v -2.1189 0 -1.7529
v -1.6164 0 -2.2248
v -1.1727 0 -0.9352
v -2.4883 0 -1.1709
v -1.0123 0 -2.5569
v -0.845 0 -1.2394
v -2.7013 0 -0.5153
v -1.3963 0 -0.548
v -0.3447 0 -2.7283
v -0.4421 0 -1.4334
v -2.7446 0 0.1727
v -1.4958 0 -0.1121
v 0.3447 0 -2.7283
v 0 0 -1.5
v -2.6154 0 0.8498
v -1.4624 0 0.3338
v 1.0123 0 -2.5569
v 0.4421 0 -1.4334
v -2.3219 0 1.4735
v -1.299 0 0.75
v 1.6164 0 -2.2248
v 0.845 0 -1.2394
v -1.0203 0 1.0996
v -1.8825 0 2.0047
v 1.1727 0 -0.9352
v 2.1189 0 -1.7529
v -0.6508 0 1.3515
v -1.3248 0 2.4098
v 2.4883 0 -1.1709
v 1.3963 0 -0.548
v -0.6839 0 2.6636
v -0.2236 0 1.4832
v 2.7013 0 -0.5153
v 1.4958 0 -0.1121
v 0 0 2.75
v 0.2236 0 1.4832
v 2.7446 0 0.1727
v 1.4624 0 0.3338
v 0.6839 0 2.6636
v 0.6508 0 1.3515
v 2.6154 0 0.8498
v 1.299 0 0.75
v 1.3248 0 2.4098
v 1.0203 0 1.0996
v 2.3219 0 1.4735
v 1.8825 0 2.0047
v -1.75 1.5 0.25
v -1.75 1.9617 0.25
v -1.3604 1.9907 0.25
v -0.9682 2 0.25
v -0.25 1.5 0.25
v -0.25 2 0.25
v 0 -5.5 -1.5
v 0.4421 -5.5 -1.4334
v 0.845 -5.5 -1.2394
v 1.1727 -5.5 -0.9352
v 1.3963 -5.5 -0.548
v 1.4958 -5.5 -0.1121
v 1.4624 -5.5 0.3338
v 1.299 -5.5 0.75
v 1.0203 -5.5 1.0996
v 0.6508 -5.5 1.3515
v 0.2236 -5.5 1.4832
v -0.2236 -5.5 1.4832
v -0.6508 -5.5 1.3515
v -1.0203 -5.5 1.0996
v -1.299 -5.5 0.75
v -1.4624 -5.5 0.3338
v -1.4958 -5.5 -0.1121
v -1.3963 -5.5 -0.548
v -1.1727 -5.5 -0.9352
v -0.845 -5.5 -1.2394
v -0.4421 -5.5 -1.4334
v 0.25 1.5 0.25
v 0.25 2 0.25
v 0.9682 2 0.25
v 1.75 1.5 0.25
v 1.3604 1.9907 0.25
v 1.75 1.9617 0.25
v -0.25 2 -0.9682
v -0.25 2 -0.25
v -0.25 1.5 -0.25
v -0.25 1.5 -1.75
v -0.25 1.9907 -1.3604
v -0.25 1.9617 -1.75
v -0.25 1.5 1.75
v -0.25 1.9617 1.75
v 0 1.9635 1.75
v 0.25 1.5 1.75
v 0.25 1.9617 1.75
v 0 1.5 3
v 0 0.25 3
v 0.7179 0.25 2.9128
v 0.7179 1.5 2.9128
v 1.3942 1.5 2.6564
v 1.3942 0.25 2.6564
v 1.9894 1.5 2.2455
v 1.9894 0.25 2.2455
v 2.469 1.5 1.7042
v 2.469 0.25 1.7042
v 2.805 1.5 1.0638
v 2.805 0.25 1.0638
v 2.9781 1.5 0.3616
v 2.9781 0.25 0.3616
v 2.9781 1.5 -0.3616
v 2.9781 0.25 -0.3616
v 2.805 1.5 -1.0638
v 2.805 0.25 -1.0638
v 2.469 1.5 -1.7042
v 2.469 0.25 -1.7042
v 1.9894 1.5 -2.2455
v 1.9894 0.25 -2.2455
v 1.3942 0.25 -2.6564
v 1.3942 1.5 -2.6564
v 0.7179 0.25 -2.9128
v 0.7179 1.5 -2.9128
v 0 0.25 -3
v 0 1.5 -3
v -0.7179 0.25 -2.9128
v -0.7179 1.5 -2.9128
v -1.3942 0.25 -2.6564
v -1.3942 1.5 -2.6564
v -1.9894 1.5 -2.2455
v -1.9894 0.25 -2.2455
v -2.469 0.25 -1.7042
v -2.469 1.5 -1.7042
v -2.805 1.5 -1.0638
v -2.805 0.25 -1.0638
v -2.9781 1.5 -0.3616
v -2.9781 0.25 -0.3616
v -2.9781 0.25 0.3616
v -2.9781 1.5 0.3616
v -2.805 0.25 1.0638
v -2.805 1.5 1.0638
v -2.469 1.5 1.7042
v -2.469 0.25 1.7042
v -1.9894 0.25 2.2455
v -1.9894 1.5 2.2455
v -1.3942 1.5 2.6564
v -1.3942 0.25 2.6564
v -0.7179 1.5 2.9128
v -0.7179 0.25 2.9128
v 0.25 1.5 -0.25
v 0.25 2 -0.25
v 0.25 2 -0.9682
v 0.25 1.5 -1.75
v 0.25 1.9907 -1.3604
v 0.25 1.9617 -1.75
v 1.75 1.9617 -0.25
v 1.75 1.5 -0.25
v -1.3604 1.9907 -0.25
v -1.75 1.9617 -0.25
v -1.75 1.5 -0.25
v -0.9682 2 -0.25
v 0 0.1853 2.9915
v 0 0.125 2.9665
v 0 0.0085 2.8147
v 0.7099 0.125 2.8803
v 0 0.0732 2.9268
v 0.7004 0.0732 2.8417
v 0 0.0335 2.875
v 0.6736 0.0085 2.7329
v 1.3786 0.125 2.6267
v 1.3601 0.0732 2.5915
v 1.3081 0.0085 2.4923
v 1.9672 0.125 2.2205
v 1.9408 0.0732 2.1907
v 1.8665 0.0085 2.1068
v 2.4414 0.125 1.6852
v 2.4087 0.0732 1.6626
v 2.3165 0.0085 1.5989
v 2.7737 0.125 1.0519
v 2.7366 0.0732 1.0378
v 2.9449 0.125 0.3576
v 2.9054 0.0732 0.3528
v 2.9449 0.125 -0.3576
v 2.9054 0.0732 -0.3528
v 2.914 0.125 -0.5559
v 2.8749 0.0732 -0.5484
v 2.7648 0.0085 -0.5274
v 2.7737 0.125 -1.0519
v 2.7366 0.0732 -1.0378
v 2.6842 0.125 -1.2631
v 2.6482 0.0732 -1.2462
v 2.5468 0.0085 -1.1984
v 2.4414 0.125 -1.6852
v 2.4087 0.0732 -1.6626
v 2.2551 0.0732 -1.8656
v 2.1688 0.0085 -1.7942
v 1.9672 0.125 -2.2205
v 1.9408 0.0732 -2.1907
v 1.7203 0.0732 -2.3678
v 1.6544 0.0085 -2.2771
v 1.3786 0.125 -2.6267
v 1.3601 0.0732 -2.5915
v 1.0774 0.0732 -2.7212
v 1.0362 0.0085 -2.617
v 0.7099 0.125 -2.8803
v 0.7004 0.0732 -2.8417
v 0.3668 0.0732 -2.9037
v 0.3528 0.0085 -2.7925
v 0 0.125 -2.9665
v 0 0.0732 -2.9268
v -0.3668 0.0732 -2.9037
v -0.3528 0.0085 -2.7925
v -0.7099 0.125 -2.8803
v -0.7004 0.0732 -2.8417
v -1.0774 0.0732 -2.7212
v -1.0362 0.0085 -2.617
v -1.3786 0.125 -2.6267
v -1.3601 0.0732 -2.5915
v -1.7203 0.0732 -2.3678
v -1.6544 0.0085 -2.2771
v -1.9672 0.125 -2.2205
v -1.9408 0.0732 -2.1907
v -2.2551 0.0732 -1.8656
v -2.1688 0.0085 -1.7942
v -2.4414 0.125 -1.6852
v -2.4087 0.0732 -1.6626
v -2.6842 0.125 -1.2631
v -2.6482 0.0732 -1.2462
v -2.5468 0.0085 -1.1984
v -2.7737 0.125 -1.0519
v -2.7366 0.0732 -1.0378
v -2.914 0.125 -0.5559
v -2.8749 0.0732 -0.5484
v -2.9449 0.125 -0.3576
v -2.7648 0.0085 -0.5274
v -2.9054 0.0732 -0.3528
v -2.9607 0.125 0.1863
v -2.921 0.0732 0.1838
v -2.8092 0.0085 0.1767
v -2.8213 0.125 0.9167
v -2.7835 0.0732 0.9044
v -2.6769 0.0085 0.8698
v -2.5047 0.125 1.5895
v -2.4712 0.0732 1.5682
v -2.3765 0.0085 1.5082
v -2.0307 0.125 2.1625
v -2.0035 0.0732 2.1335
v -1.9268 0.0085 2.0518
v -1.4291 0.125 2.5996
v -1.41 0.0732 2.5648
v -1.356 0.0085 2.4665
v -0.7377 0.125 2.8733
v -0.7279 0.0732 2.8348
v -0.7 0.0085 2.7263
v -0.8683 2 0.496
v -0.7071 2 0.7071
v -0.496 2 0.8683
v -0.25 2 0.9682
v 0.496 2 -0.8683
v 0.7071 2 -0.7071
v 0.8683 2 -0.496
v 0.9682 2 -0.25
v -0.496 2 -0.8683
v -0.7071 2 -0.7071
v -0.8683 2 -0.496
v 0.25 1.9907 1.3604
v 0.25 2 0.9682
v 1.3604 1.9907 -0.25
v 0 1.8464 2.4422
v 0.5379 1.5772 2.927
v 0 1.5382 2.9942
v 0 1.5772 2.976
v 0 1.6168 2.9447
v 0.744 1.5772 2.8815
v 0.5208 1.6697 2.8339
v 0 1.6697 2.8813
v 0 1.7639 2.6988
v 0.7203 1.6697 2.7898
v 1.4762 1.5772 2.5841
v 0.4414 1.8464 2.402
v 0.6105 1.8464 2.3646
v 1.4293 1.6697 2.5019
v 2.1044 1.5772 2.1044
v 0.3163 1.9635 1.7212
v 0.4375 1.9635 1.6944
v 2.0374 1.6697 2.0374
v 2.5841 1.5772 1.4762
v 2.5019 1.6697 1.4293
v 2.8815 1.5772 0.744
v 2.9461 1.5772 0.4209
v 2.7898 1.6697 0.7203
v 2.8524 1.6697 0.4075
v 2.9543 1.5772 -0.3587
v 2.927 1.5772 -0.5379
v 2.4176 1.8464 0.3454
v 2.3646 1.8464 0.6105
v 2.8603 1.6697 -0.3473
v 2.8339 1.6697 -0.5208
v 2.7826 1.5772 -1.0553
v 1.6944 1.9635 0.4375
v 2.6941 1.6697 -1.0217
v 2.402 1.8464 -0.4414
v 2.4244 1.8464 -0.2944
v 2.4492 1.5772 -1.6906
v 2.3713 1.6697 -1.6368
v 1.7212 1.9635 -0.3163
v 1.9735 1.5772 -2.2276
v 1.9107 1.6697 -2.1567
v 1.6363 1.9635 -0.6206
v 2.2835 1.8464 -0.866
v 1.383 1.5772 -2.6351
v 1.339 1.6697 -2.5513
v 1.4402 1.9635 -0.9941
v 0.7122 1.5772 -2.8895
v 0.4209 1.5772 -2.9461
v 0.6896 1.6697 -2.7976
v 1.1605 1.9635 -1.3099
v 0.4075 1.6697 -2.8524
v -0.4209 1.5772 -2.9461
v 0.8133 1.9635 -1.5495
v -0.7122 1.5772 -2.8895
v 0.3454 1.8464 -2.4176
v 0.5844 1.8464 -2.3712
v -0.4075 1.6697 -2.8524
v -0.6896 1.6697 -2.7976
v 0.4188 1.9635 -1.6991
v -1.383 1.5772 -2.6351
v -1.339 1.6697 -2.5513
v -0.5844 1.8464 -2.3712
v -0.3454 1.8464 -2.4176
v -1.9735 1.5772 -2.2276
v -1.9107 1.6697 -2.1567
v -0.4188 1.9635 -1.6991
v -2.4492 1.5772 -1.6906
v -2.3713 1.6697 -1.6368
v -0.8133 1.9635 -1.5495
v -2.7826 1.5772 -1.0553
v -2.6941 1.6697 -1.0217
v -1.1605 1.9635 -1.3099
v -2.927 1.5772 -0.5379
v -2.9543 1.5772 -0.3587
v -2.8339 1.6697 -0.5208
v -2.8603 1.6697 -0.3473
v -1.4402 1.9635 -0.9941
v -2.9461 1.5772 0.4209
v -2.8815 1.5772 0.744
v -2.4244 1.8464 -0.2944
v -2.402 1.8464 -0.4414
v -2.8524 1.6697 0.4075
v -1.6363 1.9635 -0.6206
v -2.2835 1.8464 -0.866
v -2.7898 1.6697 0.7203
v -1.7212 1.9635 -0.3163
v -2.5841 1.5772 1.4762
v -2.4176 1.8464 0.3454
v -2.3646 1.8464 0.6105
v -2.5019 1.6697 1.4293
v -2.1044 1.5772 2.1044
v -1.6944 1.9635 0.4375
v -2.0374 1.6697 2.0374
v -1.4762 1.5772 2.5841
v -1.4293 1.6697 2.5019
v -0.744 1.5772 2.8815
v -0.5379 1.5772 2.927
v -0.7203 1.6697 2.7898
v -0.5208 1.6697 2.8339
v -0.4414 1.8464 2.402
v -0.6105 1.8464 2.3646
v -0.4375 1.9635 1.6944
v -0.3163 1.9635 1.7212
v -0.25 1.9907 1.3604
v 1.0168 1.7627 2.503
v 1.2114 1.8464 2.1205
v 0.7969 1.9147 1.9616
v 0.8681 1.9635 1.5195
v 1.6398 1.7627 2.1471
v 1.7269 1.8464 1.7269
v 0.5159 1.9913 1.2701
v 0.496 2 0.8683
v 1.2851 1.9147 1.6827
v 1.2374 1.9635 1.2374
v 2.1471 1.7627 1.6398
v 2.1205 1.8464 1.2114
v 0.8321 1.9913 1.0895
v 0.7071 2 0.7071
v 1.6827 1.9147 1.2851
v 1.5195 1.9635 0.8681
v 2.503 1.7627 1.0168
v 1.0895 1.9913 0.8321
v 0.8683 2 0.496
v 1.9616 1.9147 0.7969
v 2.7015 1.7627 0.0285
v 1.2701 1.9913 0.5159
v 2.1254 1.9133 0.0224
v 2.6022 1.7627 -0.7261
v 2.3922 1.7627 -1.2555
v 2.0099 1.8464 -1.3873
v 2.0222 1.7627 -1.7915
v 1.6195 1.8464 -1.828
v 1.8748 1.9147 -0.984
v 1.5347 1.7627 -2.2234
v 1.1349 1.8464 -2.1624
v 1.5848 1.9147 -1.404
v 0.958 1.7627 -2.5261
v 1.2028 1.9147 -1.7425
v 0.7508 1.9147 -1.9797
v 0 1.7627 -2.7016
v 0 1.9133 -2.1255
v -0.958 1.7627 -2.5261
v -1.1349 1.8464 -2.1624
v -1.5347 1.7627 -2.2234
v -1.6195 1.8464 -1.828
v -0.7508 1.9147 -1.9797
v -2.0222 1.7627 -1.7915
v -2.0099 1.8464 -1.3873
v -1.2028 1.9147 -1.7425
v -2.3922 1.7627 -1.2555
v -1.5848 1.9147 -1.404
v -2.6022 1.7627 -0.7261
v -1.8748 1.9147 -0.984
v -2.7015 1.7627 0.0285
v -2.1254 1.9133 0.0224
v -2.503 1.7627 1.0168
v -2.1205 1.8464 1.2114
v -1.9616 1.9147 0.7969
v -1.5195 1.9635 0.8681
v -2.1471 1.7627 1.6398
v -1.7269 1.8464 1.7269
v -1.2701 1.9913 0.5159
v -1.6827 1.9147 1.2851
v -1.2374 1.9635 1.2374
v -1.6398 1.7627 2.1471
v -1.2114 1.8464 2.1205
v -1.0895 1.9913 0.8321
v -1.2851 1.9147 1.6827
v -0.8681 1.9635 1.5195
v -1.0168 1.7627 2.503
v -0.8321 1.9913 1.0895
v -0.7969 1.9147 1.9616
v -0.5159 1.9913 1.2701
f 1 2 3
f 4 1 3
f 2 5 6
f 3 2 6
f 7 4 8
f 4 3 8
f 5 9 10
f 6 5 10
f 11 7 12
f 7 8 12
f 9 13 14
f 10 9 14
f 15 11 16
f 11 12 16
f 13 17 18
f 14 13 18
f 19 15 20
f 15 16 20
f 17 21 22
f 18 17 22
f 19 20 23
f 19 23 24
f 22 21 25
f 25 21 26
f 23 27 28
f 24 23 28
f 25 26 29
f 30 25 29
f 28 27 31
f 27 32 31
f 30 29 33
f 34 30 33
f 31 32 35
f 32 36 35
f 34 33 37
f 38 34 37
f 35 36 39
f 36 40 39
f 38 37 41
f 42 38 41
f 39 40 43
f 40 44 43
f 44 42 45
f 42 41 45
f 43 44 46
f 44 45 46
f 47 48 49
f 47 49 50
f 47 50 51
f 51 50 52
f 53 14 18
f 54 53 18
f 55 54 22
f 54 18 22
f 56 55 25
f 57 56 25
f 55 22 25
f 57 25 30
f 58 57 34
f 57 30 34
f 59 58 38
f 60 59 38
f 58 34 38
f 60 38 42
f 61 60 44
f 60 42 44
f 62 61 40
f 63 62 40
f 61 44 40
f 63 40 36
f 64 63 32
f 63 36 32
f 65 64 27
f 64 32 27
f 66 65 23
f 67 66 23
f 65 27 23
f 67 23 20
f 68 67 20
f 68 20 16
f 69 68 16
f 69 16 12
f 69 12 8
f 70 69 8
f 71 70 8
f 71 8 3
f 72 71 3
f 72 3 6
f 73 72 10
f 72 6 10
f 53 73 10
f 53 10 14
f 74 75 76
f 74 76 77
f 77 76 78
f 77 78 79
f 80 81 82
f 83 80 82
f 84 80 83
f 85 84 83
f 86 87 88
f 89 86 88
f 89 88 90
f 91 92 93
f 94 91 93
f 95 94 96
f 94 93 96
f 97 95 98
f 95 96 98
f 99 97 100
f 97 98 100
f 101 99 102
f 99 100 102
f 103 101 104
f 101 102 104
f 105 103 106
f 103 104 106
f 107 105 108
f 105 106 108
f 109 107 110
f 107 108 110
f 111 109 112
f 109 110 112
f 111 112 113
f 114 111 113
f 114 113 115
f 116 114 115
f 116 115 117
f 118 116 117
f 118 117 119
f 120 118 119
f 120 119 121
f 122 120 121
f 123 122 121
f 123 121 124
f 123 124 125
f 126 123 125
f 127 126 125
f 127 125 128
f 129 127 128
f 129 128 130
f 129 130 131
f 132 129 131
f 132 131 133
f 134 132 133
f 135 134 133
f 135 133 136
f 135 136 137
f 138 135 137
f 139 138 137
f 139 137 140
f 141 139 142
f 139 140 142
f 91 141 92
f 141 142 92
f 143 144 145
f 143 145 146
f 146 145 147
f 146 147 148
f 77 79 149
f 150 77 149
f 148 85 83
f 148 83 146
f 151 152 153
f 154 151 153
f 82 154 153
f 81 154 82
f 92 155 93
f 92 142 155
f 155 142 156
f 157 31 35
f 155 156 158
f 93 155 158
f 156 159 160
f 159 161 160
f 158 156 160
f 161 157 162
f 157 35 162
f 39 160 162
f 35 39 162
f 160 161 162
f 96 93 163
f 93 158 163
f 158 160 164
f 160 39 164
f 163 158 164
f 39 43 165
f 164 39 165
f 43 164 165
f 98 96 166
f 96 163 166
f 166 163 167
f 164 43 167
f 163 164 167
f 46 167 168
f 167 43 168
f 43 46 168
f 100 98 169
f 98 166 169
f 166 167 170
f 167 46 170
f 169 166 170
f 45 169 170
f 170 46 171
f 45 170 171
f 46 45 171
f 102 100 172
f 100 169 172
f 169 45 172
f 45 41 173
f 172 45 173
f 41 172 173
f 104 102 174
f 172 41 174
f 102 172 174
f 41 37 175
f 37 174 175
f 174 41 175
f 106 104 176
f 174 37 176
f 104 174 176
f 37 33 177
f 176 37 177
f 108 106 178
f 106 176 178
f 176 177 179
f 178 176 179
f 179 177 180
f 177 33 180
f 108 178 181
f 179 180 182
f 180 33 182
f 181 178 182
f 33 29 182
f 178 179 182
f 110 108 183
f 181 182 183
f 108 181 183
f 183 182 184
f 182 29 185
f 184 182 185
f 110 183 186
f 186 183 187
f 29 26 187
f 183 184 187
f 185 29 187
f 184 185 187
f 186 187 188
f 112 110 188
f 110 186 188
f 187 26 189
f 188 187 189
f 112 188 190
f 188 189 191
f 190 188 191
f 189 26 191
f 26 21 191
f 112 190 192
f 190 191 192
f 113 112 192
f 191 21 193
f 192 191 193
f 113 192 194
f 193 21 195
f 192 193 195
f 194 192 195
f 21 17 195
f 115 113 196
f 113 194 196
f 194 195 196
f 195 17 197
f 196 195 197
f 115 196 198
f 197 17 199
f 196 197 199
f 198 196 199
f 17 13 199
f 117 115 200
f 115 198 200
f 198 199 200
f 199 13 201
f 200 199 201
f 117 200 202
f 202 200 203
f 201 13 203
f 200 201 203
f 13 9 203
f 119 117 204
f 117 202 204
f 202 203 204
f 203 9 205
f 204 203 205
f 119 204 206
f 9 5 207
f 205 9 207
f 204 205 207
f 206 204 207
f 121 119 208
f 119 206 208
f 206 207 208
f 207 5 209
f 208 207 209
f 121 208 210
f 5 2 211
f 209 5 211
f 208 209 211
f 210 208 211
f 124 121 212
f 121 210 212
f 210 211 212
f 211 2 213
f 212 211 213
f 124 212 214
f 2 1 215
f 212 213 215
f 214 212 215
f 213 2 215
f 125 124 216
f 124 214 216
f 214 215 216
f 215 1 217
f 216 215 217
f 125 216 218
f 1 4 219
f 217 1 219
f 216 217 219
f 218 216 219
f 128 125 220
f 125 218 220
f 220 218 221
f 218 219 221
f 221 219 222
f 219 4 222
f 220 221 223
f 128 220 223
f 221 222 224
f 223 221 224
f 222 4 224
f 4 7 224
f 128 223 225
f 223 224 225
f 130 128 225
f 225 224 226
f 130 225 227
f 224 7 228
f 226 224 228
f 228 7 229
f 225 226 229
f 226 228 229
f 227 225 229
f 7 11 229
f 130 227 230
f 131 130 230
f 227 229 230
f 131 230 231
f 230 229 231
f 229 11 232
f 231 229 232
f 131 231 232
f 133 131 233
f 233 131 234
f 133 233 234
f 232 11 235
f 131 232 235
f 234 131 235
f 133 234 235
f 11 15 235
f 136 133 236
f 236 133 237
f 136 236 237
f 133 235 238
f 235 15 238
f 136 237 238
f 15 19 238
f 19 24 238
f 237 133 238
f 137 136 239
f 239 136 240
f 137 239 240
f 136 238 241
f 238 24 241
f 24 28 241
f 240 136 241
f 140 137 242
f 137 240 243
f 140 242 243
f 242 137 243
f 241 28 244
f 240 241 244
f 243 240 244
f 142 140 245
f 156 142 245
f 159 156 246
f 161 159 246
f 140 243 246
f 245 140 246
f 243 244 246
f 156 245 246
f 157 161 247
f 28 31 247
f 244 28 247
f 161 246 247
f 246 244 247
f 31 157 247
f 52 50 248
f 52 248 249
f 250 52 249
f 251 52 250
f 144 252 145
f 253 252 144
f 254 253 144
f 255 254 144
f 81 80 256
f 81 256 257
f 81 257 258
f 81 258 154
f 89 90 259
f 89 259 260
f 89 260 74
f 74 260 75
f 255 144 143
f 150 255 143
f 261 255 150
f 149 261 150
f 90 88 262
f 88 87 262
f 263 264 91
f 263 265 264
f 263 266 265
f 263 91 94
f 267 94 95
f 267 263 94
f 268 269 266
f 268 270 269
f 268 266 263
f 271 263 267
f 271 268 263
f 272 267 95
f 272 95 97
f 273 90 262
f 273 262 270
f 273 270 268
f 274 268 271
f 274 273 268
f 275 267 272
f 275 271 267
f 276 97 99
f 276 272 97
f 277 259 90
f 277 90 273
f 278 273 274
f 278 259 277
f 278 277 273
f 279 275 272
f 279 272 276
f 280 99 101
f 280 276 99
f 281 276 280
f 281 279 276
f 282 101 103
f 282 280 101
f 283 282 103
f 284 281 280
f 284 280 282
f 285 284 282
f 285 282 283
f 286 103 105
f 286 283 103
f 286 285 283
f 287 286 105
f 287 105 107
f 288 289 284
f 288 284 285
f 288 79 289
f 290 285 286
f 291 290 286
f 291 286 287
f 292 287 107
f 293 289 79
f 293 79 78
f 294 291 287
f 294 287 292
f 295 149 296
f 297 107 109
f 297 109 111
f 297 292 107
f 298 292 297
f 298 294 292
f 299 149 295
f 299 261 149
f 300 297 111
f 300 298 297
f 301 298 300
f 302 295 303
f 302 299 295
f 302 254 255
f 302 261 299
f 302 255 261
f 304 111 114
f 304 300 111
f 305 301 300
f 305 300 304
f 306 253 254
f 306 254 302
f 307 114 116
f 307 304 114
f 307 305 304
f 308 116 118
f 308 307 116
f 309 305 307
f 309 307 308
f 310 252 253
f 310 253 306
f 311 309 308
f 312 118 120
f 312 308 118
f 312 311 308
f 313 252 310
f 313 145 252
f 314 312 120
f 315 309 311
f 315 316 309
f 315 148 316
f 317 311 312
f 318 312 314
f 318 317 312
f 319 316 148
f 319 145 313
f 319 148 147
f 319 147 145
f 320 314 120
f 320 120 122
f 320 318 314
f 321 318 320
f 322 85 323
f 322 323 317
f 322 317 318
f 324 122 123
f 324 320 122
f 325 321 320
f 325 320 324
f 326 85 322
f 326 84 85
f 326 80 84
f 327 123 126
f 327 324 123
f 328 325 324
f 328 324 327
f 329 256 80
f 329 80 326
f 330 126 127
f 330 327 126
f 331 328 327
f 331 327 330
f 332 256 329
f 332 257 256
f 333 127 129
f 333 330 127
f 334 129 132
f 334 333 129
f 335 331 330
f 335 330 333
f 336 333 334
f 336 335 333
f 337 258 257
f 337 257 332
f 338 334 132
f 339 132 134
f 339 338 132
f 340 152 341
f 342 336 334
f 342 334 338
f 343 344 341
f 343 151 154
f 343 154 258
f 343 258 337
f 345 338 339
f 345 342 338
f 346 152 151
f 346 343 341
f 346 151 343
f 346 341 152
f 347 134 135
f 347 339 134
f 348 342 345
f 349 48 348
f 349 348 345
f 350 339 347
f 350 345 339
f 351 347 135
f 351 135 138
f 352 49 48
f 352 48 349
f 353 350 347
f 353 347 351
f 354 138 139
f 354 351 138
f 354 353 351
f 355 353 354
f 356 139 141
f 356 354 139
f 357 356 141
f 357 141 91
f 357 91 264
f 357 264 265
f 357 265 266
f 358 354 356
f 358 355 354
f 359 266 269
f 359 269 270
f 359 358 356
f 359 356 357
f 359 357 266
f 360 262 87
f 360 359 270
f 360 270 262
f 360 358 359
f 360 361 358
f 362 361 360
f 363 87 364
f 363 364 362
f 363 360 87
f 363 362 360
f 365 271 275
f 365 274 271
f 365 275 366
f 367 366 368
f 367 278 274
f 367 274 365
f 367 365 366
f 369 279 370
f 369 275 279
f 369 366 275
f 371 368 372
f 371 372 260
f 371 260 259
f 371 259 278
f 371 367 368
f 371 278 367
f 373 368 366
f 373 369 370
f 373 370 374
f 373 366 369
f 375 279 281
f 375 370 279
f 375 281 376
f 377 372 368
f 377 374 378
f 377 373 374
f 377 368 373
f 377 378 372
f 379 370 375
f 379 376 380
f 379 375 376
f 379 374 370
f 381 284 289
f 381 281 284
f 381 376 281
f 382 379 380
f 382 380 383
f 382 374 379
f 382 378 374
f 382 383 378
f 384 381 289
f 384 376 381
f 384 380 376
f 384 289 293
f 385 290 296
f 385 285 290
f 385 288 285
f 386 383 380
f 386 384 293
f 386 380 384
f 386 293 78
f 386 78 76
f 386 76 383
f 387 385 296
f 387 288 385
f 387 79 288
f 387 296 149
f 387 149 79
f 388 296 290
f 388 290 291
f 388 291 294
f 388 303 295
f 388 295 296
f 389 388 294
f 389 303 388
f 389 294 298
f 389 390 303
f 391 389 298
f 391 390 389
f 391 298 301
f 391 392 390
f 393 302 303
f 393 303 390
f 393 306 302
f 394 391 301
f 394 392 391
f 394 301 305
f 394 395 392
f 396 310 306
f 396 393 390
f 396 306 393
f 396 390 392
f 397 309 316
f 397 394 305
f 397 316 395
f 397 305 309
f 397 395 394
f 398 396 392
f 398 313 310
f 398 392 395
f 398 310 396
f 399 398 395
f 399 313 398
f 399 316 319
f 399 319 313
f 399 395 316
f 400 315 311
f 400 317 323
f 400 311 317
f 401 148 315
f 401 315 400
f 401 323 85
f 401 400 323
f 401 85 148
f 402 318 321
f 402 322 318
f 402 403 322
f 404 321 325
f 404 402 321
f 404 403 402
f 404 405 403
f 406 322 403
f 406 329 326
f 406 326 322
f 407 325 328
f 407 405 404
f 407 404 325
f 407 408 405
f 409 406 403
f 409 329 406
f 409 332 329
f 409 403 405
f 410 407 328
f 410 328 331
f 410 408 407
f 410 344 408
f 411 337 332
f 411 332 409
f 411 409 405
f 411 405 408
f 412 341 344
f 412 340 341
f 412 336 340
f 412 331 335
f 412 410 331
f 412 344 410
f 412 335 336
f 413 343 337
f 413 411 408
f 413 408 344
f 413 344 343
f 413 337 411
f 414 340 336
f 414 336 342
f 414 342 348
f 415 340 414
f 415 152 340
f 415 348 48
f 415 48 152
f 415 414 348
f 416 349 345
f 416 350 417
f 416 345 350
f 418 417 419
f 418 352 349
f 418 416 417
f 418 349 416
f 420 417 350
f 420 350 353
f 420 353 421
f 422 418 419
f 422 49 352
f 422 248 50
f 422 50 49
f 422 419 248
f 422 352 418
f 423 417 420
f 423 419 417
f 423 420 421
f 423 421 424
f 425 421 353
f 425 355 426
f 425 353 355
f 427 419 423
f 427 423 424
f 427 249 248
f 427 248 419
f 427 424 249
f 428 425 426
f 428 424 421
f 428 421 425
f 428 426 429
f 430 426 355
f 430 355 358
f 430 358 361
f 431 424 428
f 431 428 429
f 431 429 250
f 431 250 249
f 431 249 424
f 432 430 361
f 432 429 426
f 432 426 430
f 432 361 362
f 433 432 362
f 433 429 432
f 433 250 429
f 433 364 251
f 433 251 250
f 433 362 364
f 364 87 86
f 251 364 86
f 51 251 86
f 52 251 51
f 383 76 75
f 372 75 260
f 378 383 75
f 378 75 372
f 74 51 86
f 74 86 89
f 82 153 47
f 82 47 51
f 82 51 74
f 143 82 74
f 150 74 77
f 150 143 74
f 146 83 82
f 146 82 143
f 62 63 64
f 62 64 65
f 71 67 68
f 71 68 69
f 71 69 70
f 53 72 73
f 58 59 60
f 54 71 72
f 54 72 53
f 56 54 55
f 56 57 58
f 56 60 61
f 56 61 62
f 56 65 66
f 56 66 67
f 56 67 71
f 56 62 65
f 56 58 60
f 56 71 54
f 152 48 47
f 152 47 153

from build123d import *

# Parameters (mm, degrees)
SKETCH1_R           = 3
BOSS_EXTRUDE1_DEPTH = 2
SKETCH2_R           = 1.5
BOSS_EXTRUDE2_DEPTH = 5.5
FILLET2_SIZE        = 0.5
FILLET2_SIZE_2      = 2
SKETCH3_W           = 3.5
SKETCH3_H           = 0.5
SKETCH3_W_2         = 0.5
SKETCH3_H_2         = 3.5
CUT_EXTRUDE1_DEPTH  = 0.5
FILLET3_R           = 0.25


with BuildPart() as part:
    # Sketch1 → Boss-Extrude1 (new body)
    with BuildSketch(Plane(origin=(0, 0, 0), x_dir=(1, 0, 0), z_dir=(0, 1, 0))):
        with Locations(Location((0, 0, 0), (0, 0, 270))):
            Circle(SKETCH1_R)
    extrude(amount=BOSS_EXTRUDE1_DEPTH)

    # Sketch2 → Boss-Extrude2 (add)
    with BuildSketch(Plane.XZ):
        with Locations(Location((0, 0, 0), (0, 0, 270))):
            Circle(SKETCH2_R)
    extrude(amount=BOSS_EXTRUDE2_DEPTH)

    # Fillet2
    # an asymmetric fillet: 2, 0.5 mm, written as the material it takes off along each edge
    with BuildSketch(Plane(origin=(0, 2, 0), x_dir=(0, 0, 1), z_dir=(-1, 0, 0))) as fillet2_piece_1:
        with BuildLine():
            Bezier((3, -FILLET2_SIZE), (3, 0), (3 - FILLET2_SIZE_2, 0), weights=[1, 0.707106781, 1])
            Line((3 - FILLET2_SIZE_2, 0), (3, 0))
            Line((3, 0), (3, -FILLET2_SIZE))
        make_face()
    revolve(axis=Axis((0, 2, 0), (0, 1, 0)), mode=Mode.SUBTRACT)

    # Sketch3 → Cut-Extrude1 (cut)
    with BuildSketch(Plane(origin=(0, 2, 0), x_dir=(1, 0, 0), z_dir=(0, 1, 0))):
        Rectangle(SKETCH3_W, SKETCH3_H)
        Rectangle(SKETCH3_W_2, SKETCH3_H_2)
    extrude(amount=-CUT_EXTRUDE1_DEPTH, mode=Mode.SUBTRACT)

    # Fillet3
    fillet3_edges = [part.edges().sort_by_distance(p)[0] for p in [
        (0, 0, -3),
    ]]
    fillet(fillet3_edges, radius=FILLET3_R)


solid = part.part
